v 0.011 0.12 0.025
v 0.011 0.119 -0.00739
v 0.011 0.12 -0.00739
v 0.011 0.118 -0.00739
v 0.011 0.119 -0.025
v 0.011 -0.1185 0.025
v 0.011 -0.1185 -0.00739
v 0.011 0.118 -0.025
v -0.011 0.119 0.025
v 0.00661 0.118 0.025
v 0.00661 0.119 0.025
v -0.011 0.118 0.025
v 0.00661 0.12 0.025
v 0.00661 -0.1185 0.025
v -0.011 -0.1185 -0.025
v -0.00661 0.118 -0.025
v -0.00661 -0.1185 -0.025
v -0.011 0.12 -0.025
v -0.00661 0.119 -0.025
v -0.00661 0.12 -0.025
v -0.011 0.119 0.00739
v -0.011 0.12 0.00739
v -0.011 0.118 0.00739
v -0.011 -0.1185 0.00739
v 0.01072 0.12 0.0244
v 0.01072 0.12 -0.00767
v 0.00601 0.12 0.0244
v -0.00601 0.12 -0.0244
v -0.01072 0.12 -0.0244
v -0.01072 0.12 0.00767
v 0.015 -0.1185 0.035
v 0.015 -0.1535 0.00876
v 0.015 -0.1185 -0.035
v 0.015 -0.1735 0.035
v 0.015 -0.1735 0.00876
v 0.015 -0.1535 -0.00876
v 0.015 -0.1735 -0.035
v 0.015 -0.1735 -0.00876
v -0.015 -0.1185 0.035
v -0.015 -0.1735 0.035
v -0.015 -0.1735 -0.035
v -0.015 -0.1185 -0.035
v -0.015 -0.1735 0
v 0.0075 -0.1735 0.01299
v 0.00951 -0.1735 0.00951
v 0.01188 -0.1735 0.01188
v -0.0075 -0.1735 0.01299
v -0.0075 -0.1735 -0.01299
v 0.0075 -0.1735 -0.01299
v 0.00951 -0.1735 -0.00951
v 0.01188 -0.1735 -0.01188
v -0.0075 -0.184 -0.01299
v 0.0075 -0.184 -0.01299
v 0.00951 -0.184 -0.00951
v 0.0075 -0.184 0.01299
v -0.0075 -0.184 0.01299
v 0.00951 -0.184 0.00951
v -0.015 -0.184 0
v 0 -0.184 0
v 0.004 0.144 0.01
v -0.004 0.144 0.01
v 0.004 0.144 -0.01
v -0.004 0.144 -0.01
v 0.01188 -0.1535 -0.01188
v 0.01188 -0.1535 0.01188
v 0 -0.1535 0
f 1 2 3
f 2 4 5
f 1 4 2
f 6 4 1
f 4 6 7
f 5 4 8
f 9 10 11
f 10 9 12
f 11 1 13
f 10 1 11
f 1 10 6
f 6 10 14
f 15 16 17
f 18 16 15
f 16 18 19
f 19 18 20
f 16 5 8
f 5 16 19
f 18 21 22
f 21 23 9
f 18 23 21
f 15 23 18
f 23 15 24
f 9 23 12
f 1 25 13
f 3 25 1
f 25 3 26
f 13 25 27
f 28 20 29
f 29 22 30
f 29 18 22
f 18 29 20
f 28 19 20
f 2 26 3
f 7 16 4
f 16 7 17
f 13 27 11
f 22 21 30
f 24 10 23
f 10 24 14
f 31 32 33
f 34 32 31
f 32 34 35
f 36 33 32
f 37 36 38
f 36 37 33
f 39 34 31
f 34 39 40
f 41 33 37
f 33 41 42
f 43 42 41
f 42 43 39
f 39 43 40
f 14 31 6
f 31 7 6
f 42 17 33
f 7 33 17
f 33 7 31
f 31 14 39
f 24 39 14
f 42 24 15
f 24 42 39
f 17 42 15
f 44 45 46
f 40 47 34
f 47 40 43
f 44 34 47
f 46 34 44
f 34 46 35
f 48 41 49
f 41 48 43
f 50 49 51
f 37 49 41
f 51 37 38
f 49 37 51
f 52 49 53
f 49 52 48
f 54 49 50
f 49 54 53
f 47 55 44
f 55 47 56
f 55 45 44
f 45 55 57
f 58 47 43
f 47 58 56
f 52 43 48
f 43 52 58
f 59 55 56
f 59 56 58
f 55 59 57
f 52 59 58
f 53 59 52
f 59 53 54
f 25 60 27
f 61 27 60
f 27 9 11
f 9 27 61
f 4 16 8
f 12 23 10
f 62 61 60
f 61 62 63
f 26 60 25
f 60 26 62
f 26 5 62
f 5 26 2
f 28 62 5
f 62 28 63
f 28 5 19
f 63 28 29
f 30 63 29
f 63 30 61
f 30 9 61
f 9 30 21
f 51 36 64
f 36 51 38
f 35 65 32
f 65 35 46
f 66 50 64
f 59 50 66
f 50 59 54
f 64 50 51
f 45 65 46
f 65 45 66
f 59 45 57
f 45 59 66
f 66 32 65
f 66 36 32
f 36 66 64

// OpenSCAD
$fn = 96;

// Target bounding box (mm): ~X=0.03, Y=0.32, Z=0.07
// Elongated along Y

// Overall bbox targets
bbox_x = 0.03;
bbox_y = 0.32;
bbox_z = 0.07;

// Main dimensions
shaft_len = 0.24;
shaft_w   = 0.022;
shaft_h   = 0.05;

head_len  = 0.055;
head_w    = bbox_x;   // keep within bbox_x
head_h    = bbox_z;   // keep within bbox_z

collar_len = 0.012;
collar_r   = bbox_x/2;

socket_depth  = 0.03;
socket_square = 0.016;

tip_len   = 0.025;
tip_end_w = 0.008;
tip_end_h = 0.02;

facet_chamfer = 0.002;

// Use a small overlap for watertight unions (in mm)
overlap = 0.0015;

// Helpers
function clamp(v, lo, hi) = v < lo ? lo : (v > hi ? hi : v);

module faceted_rect_prism(x, y, z, chamfer) {
    // Slight faceting on the XZ cross-section
    intersection() {
        cube([x, y, z], center=true);
        rotate([0, 45, 0])
            cube([x + 2*chamfer, y + 2*chamfer, z + 2*chamfer], center=true);
    }
}

module tapered_tip_prism(len, w0, h0, w1, h1) {
    // Taper along Y using hull between two thin slices
    eps = 0.001;
    hull() {
        translate([0, -len/2, 0]) cube([w0, eps, h0], center=true);
        translate([0,  len/2, 0]) cube([w1, eps, h1], center=true);
    }
}

module head_block(len, w, h) {
    cube([w, len, h], center=true);
}

module collar_hex_y(len, r) {
    // Hex collar with axis along Y
    rotate([90, 0, 0])
        cylinder(h=len, r=r, center=true, $fn=6);
}

module socket_cut_from_face(depth, sq) {
    // Cut a recessed diamond (rotated square) socket along +Y from the end face.
    // Make it slightly larger in XZ and slightly deeper to read clearly in ortho views.
    rotate([0, 45, 0])
        cube([sq, depth, sq], center=false);
}

// --- Layout along Y axis (recalculated so parts touch with overlap) ---
// Place shaft centered at origin.
y_shaft_c = 0;

// Head attaches to negative-Y end of shaft
y_head_c = -(shaft_len/2 + head_len/2 - overlap);

// Collar sits at the very negative-Y end of the head (and overlaps into it)
y_collar_c = (y_head_c - head_len/2) - collar_len/2 + overlap;

// Tip attaches to positive-Y end of shaft
y_tip_c = +(shaft_len/2 + tip_len/2 - overlap);

// Socket placement: start exactly at the outer (most negative-Y) face of the collar/head region
socket_depth_eff = clamp(socket_depth, 0.002, head_len + collar_len - 0.002);

// Outer face of collar (most negative Y)
y_outer_face = y_collar_c - collar_len/2;

// Start the cut at the outer face and push inward along +Y
// (center=false cube starts at its local origin)
y_socket_start = y_outer_face - 0.0005; // tiny bias outward to ensure a clean opening

difference() {
    union() {
        // Shaft
        faceted_rect_prism(shaft_w, shaft_len, shaft_h, facet_chamfer);

        // Head
        translate([0, y_head_c, 0])
            head_block(head_len, head_w, head_h);

        // Collar (hex) at head end
        translate([0, y_collar_c, 0])
            collar_hex_y(collar_len, collar_r);

        // Tip
        translate([0, y_tip_c, 0])
            tapered_tip_prism(tip_len, shaft_w, shaft_h, tip_end_w, tip_end_h);
    }

    // Recessed socket opening (diamond), clearly visible from the collar end
    translate([0, y_socket_start, 0])
        socket_cut_from_face(socket_depth_eff + 0.001, socket_square * 1.05);
}
